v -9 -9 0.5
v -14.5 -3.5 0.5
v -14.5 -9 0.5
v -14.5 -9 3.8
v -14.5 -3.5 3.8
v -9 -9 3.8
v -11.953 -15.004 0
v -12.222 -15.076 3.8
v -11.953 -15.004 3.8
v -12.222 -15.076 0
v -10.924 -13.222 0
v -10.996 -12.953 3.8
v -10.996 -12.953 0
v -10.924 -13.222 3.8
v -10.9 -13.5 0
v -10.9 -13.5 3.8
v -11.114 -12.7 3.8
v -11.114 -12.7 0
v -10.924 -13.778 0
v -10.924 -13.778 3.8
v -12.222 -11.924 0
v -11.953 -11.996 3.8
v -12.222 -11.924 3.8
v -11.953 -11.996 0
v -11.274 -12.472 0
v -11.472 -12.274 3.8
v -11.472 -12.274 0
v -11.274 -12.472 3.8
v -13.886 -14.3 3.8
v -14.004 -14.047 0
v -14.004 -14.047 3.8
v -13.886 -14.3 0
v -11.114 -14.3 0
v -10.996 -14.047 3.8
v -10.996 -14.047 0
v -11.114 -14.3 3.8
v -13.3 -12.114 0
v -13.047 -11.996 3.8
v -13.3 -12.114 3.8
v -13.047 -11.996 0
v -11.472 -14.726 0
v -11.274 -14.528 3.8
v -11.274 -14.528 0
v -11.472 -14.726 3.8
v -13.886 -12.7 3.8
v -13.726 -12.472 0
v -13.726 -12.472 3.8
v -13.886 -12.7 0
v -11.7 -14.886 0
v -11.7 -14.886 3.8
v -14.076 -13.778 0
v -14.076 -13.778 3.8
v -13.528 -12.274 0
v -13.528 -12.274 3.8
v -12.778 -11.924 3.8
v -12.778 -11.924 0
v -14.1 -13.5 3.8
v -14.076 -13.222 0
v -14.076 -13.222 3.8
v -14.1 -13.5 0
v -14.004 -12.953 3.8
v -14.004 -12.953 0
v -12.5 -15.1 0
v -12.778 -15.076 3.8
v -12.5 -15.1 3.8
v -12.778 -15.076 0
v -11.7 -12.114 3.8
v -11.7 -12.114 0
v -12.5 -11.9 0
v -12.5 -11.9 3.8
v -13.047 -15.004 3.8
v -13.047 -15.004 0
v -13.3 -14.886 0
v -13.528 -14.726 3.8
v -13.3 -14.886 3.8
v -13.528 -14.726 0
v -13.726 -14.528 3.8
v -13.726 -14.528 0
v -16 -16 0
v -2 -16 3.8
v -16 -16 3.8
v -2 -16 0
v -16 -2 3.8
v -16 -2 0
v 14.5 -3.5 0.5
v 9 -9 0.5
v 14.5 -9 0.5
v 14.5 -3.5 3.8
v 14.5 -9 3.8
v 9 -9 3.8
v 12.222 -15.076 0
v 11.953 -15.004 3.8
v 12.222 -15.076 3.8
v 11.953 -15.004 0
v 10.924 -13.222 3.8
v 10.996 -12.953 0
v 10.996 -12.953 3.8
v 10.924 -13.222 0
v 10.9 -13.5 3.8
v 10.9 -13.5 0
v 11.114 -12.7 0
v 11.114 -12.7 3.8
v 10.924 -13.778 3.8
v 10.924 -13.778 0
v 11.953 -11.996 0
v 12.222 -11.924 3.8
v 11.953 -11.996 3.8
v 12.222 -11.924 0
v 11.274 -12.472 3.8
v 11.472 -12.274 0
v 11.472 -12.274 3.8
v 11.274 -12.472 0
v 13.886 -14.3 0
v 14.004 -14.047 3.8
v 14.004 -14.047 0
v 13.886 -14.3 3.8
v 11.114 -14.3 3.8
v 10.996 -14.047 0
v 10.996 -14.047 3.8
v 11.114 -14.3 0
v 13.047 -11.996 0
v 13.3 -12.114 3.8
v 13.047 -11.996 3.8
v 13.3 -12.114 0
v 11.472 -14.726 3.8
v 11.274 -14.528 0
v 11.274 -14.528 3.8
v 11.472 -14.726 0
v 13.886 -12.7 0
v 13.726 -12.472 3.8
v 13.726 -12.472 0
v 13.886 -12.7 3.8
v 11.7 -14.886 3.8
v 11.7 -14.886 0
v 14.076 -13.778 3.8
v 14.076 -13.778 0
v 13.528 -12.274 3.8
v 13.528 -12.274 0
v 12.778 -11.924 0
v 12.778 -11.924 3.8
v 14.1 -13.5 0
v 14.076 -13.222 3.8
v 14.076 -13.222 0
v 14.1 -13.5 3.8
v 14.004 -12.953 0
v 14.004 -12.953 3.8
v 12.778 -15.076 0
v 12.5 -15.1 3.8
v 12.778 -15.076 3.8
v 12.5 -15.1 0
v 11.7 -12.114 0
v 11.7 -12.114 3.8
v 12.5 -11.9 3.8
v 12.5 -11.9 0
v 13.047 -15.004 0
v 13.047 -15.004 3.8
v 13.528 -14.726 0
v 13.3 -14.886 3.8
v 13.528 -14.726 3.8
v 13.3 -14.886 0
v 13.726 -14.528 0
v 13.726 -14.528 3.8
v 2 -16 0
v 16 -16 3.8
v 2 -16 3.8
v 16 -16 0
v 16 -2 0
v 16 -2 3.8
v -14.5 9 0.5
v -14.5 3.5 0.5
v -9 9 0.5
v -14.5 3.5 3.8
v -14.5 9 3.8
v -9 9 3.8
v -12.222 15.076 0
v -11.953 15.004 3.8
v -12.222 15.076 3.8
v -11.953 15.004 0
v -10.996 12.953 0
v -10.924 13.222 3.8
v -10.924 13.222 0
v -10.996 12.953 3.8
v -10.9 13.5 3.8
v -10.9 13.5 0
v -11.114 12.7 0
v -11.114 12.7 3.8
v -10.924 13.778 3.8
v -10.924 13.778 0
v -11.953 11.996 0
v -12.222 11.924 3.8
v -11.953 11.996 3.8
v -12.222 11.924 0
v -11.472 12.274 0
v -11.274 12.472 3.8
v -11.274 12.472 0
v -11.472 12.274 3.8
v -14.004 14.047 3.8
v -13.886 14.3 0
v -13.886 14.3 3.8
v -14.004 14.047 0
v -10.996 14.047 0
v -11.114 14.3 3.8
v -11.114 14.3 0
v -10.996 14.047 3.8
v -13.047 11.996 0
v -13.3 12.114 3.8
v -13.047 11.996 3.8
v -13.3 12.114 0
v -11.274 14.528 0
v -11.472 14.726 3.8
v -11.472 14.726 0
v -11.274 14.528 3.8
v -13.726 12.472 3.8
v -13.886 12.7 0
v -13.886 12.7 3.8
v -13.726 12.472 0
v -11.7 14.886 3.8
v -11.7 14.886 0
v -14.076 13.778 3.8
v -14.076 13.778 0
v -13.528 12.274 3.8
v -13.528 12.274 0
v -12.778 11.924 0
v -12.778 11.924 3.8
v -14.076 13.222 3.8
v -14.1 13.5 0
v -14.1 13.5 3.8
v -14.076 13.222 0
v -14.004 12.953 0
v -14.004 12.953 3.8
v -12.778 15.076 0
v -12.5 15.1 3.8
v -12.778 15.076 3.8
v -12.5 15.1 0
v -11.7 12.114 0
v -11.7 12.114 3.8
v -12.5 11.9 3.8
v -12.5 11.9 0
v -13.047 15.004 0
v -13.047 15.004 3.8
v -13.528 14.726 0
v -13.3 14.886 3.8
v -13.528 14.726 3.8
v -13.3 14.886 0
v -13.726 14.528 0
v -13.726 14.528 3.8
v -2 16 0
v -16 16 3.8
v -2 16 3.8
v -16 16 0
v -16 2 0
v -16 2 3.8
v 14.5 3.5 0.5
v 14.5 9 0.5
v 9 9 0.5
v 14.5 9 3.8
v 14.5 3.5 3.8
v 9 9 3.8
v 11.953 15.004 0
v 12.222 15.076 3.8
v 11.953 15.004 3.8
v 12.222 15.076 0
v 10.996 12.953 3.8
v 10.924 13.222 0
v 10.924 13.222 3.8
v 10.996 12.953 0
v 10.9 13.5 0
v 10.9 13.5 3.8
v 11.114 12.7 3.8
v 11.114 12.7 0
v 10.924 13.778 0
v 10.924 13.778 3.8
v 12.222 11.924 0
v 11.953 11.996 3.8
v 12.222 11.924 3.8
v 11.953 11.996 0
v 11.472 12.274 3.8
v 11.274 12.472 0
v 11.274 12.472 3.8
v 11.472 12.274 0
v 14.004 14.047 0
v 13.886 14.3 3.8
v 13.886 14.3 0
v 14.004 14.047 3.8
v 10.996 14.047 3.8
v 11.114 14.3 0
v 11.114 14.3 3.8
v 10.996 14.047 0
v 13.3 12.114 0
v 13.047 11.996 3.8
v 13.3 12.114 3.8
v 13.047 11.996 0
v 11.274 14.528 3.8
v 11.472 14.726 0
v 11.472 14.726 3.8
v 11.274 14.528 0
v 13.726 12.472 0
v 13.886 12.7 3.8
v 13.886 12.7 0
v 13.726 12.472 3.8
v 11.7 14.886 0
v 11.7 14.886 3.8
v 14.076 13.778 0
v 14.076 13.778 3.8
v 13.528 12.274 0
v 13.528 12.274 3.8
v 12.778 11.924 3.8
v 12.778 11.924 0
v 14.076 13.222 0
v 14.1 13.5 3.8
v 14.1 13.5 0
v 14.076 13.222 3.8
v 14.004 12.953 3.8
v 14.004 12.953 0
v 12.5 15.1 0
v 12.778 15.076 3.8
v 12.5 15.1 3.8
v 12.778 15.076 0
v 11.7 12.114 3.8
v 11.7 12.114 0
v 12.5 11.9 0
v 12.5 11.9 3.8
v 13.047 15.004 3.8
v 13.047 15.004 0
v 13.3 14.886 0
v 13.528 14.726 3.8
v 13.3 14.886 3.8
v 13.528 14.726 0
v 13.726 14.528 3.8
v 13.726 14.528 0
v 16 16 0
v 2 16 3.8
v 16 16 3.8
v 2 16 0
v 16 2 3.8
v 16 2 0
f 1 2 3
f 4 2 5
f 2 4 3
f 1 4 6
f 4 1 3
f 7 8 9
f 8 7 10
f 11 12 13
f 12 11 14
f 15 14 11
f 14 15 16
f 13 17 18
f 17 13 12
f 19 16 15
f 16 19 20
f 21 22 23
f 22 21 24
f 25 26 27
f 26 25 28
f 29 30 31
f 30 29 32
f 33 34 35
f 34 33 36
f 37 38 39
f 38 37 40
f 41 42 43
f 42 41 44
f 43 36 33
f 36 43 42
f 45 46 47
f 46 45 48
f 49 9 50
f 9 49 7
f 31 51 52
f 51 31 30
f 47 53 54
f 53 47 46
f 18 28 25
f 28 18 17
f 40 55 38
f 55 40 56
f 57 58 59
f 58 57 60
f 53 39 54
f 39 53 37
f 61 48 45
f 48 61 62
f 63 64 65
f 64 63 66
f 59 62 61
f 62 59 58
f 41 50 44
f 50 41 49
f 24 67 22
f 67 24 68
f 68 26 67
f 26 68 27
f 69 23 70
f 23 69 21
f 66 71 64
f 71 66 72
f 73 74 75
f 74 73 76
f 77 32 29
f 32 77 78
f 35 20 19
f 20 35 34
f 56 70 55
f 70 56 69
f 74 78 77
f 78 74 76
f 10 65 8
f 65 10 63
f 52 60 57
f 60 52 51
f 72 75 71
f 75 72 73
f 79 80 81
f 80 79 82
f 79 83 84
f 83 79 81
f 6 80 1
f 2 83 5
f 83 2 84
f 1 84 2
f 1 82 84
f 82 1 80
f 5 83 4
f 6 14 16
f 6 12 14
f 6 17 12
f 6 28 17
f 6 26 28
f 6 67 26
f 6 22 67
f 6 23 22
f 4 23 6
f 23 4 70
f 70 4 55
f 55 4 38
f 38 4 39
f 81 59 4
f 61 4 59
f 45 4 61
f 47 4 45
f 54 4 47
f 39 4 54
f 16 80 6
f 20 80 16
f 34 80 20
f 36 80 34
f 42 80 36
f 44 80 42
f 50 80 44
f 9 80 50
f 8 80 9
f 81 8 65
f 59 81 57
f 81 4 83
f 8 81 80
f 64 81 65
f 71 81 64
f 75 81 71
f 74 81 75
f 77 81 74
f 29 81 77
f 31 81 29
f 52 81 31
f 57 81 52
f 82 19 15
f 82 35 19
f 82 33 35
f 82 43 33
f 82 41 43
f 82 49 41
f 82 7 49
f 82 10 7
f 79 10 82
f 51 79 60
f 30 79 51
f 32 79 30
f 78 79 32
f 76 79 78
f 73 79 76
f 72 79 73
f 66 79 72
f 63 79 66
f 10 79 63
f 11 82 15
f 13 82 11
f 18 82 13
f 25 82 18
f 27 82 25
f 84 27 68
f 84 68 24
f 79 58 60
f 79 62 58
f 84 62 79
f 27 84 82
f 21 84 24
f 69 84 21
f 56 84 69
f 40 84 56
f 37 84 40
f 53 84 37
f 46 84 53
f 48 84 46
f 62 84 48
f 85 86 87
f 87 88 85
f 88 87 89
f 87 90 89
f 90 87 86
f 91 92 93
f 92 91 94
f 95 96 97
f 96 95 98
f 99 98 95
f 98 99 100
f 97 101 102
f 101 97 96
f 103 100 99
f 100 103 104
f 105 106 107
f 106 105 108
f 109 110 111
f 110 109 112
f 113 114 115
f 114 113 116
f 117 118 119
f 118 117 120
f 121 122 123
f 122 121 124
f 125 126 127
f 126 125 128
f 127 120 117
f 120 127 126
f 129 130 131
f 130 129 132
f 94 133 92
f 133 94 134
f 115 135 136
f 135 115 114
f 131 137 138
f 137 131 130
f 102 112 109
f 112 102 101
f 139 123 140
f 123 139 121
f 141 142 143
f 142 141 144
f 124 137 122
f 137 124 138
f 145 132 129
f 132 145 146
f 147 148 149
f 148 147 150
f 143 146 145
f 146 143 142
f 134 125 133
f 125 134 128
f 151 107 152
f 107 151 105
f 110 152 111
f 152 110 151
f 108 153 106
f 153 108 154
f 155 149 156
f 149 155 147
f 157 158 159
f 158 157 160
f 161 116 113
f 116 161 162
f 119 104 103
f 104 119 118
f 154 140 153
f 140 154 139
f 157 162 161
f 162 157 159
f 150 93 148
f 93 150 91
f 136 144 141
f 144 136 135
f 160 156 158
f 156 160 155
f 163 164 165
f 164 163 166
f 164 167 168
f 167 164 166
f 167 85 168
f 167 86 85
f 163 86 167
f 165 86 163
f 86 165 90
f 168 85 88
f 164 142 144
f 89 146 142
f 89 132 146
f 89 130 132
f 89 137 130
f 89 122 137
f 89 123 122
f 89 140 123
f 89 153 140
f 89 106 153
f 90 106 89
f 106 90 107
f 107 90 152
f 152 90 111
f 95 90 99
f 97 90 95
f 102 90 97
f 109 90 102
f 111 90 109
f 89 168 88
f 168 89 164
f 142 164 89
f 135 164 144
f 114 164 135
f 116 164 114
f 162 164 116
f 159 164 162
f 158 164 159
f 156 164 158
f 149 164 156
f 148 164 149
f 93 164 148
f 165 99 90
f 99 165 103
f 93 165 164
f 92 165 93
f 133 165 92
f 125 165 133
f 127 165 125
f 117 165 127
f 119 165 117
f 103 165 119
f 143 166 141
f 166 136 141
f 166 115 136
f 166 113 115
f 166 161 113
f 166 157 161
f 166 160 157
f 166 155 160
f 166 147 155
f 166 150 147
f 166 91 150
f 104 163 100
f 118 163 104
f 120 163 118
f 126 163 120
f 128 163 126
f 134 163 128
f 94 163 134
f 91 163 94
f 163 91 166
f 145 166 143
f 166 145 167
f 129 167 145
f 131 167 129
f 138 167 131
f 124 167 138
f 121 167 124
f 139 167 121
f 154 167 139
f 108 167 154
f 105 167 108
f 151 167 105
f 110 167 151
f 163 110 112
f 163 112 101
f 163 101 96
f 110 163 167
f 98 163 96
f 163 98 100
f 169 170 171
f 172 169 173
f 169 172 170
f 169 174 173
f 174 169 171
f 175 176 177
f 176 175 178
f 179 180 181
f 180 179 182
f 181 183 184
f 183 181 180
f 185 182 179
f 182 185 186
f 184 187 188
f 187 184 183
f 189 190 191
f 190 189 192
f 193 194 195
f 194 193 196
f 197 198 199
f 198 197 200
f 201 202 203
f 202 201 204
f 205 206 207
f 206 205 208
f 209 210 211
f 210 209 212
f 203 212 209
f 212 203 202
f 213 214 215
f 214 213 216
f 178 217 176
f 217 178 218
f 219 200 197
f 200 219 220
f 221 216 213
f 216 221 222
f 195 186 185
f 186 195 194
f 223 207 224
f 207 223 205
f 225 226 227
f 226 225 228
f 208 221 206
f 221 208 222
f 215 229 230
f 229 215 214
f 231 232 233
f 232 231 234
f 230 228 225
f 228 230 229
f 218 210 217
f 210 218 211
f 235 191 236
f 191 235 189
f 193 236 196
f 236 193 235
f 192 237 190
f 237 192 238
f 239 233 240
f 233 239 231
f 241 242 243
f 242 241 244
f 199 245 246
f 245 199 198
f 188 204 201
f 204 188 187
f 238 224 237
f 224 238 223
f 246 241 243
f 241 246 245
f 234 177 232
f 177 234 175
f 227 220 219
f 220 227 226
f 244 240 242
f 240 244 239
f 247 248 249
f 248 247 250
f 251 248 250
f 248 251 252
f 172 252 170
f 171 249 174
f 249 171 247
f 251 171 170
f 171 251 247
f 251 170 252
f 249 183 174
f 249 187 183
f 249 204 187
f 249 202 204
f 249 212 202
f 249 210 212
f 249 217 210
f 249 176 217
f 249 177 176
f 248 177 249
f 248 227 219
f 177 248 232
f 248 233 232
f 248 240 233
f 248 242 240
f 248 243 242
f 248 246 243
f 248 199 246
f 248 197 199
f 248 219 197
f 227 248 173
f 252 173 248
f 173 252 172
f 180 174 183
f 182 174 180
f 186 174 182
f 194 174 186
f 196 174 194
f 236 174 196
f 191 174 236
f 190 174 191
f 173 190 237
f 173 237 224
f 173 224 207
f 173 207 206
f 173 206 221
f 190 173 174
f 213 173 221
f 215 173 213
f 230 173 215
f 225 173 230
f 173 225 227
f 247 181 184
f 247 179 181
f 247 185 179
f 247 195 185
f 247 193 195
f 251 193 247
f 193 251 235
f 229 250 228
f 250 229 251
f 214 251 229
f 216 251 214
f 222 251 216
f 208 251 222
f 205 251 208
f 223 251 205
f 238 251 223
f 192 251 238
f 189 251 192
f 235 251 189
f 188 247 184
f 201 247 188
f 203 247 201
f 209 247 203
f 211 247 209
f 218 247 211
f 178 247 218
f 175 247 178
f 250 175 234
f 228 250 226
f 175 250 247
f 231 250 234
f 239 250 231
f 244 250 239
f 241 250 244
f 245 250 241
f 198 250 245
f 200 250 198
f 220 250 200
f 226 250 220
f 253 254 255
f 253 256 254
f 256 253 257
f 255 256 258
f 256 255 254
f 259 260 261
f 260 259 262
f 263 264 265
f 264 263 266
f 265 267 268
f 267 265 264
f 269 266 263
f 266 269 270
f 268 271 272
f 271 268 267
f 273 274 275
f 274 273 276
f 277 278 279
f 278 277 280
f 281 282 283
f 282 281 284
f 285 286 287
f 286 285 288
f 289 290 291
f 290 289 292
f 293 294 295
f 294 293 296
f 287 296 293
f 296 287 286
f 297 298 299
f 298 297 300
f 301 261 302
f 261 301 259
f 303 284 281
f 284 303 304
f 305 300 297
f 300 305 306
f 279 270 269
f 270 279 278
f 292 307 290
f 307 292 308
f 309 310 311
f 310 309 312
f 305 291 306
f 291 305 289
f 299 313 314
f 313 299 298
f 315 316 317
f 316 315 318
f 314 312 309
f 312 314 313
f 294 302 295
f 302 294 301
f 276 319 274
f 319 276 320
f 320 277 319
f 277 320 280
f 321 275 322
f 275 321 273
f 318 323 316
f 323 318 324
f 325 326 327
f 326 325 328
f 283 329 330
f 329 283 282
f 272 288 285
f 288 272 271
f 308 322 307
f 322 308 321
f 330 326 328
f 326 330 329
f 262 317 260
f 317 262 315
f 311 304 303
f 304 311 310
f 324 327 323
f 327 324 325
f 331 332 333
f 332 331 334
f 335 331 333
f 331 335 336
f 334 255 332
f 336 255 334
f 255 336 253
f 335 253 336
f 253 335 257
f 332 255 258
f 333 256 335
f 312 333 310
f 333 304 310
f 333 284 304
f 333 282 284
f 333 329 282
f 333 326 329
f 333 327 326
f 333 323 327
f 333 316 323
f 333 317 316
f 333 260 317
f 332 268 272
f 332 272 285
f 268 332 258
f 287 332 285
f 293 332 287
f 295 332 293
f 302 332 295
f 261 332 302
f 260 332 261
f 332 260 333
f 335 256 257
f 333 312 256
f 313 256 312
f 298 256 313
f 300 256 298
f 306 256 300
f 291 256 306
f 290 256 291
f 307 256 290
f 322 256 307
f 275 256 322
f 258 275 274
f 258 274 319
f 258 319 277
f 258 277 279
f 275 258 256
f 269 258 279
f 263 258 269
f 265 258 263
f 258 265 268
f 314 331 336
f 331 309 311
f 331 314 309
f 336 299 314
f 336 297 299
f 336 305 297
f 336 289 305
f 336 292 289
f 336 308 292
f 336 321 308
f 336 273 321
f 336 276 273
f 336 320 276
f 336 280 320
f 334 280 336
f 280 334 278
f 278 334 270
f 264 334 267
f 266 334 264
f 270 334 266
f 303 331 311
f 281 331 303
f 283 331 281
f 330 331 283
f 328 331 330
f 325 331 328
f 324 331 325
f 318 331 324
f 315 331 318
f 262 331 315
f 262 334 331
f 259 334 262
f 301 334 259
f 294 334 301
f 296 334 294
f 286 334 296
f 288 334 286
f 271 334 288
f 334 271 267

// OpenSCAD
//
// Glass Corner Clip for Prusa i2
// 
// Default setup is for 214mm x 214mm
// heated bed with 200mm x 213mm Borosilicate Glass
//
// Enter your own dimensions to customize the clips
//
// Created by Jody Krivohlavek
// 09/12/2016
// V1.0

// Variable declarations

clip_side = 14;          // width and length of the clip
clip_hold = 0.5;         // thickness of holding layer on top of the glass
glass_width = 213;       // width of glass (X Axis)
glass_length = 200;      // length of glass (Y Axis)
glass_thickness = 3.3;   // thickness of glass surface
bed_hole_width = 209;    // width of hole spacing on heated bed
bed_hole_length = 209;   // length of hole spacing on heated bed
bed_hole_diameter = 3.2; // bed hole diameter
bed_width = 214;         // width of heated bed (X Axis)
bed_length = 214;        // length of heated bed (Y Axis)


// Call Modules

// Original Left Front Corner
translate([-(clip_side+2),-(clip_side+2),0]){
    cornerclip();
}

// Right Front Corner
translate([clip_side+2,-(clip_side+2),0]){
    scale([-1,1,1]) cornerclip();
}

// Left Rear Corner
translate([-(clip_side+2),clip_side+2,0]){
    scale([1,-1,1]) cornerclip();
}

// Right Rear Corner
translate([clip_side+2,clip_side+2,0]){
    scale([-1,-1,1]) cornerclip();
}

// Module code

module cornerclip(){
    
    difference(){
        
        // Base cube of part
        
        polyhedron(
        points=[[0,0,0], [clip_side,0,0], [0,clip_side,0],
          [0,0,clip_hold+glass_thickness],
          [clip_side,0,clip_hold+glass_thickness],
          [0,clip_side,clip_hold+glass_thickness]],
        faces=[[0,3,4,1],[1,4,5,2],[0,2,5,3],[0,1,2],[3,5,4]]
        );

        
        // Parts cut out of Base
        union(){
            
            // Cut out for Glass Plate
            translate([(bed_width-glass_width+2)/2,(bed_length-glass_length)/2,clip_hold])
              #cube([clip_side,clip_side,glass_thickness+1]);
            
            // Heated Bed mounting hole
            translate([(bed_width-bed_hole_width+2)/2,(bed_length-bed_hole_length)/2,-1])
              #cylinder(h = glass_thickness+clip_hold+2, r = bed_hole_diameter/2, $fn = 36);
            
        }
    }
}
